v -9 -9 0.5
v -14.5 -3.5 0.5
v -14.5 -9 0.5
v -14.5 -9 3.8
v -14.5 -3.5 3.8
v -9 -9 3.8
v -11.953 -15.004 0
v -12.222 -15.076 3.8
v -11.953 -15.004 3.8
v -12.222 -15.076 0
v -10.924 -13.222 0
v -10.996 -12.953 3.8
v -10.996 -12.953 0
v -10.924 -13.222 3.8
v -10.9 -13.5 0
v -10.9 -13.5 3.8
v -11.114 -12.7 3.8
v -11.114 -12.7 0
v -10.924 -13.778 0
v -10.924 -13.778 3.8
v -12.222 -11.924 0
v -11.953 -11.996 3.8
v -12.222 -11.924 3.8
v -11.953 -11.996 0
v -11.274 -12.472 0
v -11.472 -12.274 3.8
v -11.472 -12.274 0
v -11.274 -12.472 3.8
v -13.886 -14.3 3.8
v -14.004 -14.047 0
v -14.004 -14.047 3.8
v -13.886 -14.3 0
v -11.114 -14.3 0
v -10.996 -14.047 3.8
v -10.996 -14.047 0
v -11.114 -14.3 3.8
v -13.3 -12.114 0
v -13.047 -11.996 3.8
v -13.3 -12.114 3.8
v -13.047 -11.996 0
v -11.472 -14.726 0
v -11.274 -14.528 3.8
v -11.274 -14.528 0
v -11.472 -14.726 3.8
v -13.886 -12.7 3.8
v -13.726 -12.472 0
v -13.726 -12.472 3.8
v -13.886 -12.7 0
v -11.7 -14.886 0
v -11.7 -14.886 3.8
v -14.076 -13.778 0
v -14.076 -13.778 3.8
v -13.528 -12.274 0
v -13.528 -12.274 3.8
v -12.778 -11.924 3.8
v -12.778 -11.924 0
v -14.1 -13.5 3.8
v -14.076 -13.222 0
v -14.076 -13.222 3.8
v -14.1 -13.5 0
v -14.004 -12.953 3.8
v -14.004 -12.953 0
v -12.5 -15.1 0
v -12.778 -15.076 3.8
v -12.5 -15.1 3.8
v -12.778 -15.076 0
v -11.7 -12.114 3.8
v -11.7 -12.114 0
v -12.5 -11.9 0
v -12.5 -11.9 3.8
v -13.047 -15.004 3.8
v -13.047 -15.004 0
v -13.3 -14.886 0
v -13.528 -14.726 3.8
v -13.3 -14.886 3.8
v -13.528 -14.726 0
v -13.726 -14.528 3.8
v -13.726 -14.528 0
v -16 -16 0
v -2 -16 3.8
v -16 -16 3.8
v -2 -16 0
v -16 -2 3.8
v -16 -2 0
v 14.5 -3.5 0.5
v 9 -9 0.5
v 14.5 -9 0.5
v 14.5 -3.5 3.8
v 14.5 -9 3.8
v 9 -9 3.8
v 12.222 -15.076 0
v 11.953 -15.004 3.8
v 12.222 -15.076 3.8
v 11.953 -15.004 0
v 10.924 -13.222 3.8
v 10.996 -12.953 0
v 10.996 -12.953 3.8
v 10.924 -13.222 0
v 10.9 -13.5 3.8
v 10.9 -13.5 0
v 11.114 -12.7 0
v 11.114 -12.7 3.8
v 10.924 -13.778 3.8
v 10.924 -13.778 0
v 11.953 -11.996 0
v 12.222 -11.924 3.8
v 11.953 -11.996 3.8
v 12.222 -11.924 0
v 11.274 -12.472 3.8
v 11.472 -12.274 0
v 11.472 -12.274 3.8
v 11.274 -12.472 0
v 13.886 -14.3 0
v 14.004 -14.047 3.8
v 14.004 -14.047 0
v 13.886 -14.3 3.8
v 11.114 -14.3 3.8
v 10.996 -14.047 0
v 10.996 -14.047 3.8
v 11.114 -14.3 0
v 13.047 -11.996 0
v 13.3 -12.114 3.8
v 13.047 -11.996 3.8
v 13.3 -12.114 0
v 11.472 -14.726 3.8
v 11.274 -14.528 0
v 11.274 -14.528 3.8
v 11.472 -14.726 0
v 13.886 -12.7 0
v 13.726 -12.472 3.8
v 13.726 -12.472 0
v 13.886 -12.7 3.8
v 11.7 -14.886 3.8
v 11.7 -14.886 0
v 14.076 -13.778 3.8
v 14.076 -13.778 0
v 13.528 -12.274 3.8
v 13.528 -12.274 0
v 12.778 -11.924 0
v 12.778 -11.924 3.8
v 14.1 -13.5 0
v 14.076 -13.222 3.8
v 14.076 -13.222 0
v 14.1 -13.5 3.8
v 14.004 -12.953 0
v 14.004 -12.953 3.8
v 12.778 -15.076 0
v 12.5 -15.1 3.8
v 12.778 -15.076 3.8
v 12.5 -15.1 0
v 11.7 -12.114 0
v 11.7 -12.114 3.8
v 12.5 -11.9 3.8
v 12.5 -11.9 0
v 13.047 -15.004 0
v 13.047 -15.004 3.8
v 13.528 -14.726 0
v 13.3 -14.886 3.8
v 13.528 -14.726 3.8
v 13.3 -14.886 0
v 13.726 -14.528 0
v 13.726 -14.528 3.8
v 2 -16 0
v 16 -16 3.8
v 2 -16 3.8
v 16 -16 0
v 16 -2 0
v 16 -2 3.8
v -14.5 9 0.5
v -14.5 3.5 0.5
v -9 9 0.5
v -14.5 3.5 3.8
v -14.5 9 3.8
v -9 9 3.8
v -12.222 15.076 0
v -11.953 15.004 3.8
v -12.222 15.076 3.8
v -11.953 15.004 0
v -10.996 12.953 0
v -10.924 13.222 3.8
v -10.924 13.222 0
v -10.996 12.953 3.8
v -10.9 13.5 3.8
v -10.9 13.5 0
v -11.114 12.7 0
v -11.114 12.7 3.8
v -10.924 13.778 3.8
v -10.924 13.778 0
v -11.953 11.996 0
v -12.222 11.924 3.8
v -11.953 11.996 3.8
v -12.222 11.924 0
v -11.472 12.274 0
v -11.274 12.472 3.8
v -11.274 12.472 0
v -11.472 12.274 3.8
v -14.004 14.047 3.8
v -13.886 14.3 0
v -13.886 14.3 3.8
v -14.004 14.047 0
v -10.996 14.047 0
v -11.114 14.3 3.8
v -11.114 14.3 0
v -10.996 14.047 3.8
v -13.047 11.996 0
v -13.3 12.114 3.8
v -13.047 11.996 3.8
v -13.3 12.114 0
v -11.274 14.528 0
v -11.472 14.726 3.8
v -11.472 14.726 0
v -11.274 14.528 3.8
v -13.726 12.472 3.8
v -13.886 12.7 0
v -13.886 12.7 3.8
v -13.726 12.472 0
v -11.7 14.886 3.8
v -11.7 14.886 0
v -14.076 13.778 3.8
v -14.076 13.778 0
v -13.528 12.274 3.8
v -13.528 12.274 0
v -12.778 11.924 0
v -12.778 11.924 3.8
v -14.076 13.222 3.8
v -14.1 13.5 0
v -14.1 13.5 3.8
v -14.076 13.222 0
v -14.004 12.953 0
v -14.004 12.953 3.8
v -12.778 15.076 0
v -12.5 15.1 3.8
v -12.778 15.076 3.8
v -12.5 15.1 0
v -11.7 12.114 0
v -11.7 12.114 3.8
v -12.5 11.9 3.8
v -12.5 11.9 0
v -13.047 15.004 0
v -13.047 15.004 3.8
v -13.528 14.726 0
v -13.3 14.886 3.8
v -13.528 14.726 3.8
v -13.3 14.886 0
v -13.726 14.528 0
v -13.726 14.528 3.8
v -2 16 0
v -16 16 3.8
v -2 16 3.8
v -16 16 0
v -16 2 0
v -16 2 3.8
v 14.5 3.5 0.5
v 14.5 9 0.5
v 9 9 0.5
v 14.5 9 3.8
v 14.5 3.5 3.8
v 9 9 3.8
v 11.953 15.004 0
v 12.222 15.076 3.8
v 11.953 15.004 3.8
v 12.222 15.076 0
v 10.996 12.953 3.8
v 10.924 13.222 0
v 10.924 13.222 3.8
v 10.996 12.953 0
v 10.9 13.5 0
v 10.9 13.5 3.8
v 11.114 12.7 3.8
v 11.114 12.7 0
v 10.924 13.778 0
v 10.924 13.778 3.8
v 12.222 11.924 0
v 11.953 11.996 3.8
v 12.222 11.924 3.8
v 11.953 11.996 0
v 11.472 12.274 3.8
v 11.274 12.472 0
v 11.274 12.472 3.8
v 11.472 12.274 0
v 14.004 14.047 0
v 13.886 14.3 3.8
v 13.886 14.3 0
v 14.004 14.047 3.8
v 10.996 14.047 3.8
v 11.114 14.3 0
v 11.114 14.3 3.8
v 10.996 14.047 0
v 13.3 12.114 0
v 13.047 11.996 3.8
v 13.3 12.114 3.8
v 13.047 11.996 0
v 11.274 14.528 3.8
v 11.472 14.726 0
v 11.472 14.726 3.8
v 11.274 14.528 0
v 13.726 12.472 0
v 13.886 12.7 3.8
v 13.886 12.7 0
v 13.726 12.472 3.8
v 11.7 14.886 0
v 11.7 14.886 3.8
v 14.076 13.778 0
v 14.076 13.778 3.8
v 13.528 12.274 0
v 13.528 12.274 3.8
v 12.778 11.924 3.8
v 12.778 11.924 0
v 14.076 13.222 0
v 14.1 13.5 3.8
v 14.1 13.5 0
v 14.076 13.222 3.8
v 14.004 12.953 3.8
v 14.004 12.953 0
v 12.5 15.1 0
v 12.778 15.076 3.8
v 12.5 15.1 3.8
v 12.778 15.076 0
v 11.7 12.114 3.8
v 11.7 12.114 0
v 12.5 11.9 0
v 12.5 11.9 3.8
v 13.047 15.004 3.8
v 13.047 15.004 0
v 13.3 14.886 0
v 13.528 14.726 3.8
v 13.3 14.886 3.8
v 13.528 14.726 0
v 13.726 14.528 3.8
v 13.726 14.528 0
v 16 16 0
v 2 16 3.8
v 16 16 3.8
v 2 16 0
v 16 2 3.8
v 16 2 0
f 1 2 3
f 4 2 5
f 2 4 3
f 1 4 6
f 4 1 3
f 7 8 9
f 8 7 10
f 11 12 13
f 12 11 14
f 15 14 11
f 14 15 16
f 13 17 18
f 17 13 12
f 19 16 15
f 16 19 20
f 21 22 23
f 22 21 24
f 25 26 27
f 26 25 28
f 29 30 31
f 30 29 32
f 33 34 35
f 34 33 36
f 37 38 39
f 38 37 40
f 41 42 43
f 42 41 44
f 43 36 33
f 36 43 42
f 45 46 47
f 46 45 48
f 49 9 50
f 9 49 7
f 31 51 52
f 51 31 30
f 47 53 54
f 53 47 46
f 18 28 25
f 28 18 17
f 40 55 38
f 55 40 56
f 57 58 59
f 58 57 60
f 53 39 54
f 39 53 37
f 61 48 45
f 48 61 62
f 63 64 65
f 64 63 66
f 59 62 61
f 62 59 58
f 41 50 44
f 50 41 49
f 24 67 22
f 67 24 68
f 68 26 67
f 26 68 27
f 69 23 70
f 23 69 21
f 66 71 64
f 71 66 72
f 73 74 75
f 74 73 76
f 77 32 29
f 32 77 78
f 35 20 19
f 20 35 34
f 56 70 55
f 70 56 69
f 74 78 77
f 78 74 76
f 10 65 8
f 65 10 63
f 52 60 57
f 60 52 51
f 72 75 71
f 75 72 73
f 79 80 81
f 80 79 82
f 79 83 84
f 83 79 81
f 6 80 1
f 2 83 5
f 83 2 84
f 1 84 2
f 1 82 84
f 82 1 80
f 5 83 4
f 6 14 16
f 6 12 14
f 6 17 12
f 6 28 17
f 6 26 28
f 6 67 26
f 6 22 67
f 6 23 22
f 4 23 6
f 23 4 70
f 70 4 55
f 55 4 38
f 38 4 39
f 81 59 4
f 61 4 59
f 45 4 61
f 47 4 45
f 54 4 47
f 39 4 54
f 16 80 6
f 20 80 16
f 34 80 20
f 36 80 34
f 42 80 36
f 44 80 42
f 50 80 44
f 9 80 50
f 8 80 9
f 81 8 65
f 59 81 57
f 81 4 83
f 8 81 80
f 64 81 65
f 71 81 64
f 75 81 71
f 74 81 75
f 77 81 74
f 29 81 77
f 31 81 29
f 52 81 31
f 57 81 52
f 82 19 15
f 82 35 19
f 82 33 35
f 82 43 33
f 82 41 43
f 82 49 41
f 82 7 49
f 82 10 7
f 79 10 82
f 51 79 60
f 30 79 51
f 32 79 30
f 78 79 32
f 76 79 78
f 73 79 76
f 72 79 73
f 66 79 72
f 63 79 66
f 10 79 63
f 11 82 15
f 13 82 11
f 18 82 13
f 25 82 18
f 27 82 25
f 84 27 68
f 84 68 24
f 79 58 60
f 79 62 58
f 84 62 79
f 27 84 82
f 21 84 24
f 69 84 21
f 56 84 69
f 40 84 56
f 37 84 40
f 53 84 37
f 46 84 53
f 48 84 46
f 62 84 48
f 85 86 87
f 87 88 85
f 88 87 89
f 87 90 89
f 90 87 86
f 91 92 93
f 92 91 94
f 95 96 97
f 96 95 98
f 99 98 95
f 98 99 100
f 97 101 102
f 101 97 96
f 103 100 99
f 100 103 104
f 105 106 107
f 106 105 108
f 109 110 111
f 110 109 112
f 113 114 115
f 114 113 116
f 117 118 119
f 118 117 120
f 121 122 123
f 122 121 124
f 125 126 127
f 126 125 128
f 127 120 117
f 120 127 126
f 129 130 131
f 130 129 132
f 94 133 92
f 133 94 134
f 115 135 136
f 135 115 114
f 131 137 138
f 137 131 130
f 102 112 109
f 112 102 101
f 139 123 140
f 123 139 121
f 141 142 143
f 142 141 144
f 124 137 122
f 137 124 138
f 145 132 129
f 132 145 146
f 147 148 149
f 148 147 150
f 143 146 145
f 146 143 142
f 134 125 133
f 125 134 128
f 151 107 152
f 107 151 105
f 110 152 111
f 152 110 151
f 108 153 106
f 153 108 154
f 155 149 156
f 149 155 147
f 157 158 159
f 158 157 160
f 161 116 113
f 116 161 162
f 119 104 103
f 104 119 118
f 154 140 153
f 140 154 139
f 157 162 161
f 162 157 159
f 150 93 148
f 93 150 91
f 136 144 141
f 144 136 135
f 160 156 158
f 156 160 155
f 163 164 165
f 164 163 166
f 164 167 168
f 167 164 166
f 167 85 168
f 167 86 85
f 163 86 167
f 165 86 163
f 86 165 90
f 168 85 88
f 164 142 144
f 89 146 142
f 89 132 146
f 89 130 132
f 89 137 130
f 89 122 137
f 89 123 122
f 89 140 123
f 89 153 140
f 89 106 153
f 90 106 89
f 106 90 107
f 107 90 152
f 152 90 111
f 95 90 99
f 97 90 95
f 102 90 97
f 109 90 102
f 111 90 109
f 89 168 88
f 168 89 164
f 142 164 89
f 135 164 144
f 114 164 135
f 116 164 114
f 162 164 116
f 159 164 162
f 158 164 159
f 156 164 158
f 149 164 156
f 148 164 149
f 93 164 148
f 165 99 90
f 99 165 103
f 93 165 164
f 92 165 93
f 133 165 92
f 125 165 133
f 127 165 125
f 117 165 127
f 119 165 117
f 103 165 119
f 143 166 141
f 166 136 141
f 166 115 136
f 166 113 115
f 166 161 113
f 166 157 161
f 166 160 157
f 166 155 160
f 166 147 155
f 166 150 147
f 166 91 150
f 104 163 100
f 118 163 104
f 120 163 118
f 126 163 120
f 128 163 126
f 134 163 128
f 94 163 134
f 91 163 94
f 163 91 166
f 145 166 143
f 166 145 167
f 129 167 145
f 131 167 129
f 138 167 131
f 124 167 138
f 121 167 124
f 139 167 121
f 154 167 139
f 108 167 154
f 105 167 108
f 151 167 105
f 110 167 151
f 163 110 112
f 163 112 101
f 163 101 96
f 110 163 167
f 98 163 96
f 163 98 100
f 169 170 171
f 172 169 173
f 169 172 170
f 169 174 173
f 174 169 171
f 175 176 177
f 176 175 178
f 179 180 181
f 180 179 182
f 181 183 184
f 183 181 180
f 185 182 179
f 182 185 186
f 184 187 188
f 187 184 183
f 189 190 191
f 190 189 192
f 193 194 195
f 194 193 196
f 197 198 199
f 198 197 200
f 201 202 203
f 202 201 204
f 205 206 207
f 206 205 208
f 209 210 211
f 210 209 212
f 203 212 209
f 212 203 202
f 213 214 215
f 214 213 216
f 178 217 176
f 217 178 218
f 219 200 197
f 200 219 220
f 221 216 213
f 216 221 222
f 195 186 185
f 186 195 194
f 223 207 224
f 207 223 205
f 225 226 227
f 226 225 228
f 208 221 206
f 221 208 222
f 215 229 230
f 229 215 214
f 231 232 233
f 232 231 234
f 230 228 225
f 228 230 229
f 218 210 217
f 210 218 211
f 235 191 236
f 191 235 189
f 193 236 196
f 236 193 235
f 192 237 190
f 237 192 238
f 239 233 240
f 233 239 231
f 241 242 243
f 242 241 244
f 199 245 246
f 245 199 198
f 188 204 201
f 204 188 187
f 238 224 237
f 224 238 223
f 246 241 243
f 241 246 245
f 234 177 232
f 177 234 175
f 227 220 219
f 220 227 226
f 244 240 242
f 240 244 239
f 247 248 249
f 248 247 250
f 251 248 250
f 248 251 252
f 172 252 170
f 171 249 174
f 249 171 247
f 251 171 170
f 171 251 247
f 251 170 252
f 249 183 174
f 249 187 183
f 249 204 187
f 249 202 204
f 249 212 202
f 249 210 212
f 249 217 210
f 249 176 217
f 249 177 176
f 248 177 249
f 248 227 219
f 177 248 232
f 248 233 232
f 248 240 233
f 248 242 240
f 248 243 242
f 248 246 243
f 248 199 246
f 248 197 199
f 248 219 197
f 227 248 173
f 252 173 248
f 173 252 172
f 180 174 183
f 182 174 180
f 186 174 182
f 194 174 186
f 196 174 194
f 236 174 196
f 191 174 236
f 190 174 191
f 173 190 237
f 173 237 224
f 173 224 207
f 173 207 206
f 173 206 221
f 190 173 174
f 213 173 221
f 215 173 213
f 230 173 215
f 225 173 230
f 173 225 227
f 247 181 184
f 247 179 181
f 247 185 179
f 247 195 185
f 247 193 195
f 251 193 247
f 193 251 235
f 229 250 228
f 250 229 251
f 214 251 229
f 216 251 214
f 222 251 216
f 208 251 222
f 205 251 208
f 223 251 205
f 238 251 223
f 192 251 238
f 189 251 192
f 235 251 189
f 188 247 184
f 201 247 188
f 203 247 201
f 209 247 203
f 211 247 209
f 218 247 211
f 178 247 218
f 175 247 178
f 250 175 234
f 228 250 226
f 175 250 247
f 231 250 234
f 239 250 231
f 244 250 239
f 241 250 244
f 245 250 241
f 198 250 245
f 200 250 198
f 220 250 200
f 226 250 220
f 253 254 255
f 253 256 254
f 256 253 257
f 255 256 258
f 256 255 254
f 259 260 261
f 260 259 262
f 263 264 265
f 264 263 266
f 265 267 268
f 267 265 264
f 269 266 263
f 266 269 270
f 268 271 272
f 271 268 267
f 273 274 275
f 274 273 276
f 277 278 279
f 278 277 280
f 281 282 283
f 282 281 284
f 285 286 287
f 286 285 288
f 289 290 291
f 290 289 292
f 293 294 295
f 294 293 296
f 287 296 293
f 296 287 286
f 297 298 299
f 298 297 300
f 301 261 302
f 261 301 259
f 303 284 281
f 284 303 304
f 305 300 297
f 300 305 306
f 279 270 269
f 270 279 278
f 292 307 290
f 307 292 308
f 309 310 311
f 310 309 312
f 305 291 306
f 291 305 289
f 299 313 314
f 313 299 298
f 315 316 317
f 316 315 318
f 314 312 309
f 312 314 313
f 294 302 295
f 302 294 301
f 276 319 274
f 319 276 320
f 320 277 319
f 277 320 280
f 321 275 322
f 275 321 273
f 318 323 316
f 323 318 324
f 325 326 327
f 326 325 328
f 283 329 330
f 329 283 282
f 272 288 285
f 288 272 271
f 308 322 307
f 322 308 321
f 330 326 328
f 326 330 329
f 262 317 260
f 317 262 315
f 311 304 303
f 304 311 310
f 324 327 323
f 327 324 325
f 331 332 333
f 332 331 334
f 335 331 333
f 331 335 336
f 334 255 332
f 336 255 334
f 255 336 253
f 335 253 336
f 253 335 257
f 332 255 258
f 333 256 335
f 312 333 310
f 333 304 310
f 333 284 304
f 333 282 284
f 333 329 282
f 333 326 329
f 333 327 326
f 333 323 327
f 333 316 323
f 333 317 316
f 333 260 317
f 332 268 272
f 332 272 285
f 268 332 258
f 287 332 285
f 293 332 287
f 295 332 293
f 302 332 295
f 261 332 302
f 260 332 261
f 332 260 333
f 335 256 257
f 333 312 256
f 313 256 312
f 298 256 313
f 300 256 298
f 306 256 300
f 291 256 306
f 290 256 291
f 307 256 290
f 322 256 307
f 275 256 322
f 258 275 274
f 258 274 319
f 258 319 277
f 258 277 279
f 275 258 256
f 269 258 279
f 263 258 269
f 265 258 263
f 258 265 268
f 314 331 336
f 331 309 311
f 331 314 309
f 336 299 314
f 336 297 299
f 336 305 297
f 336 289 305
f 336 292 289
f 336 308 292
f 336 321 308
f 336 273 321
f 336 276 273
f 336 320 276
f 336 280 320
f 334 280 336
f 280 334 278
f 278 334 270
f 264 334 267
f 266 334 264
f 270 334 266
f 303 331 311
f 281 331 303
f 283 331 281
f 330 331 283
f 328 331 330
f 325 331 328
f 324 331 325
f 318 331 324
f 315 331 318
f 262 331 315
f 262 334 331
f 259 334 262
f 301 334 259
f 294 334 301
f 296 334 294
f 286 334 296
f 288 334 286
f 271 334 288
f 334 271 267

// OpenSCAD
//
// Glass Corner Clip for Prusa i2
// 
// Default setup is for 214mm x 214mm
// heated bed with 200mm x 213mm Borosilicate Glass
//
// Enter your own dimensions to customize the clips
//
// Created by Jody Krivohlavek
// 09/12/2016
// V1.0

// Variable declarations

clip_side = 14;          // width and length of the clip
clip_hold = 0.5;         // thickness of holding layer on top of the glass
glass_width = 213;       // width of glass (X Axis)
glass_length = 200;      // length of glass (Y Axis)
glass_thickness = 3.3;   // thickness of glass surface
bed_hole_width = 209;    // width of hole spacing on heated bed
bed_hole_length = 209;   // length of hole spacing on heated bed
bed_hole_diameter = 3.2; // bed hole diameter
bed_width = 214;         // width of heated bed (X Axis)
bed_length = 214;        // length of heated bed (Y Axis)


// Call Modules

// Original Left Front Corner
translate([-(clip_side+2),-(clip_side+2),0]){
    cornerclip();
}

// Right Front Corner
translate([clip_side+2,-(clip_side+2),0]){
    scale([-1,1,1]) cornerclip();
}

// Left Rear Corner
translate([-(clip_side+2),clip_side+2,0]){
    scale([1,-1,1]) cornerclip();
}

// Right Rear Corner
translate([clip_side+2,clip_side+2,0]){
    scale([-1,-1,1]) cornerclip();
}

// Module code

module cornerclip(){
    
    difference(){
        
        // Base cube of part
        
        polyhedron(
        points=[[0,0,0], [clip_side,0,0], [0,clip_side,0],
          [0,0,clip_hold+glass_thickness],
          [clip_side,0,clip_hold+glass_thickness],
          [0,clip_side,clip_hold+glass_thickness]],
        faces=[[0,3,4,1],[1,4,5,2],[0,2,5,3],[0,1,2],[3,5,4]]
        );

        
        // Parts cut out of Base
        union(){
            
            // Cut out for Glass Plate
            translate([(bed_width-glass_width+2)/2,(bed_length-glass_length)/2,clip_hold])
              #cube([clip_side,clip_side,glass_thickness+1]);
            
            // Heated Bed mounting hole
            translate([(bed_width-bed_hole_width+2)/2,(bed_length-bed_hole_length)/2,-1])
              #cylinder(h = glass_thickness+clip_hold+2, r = bed_hole_diameter/2, $fn = 36);
            
        }
    }
}
